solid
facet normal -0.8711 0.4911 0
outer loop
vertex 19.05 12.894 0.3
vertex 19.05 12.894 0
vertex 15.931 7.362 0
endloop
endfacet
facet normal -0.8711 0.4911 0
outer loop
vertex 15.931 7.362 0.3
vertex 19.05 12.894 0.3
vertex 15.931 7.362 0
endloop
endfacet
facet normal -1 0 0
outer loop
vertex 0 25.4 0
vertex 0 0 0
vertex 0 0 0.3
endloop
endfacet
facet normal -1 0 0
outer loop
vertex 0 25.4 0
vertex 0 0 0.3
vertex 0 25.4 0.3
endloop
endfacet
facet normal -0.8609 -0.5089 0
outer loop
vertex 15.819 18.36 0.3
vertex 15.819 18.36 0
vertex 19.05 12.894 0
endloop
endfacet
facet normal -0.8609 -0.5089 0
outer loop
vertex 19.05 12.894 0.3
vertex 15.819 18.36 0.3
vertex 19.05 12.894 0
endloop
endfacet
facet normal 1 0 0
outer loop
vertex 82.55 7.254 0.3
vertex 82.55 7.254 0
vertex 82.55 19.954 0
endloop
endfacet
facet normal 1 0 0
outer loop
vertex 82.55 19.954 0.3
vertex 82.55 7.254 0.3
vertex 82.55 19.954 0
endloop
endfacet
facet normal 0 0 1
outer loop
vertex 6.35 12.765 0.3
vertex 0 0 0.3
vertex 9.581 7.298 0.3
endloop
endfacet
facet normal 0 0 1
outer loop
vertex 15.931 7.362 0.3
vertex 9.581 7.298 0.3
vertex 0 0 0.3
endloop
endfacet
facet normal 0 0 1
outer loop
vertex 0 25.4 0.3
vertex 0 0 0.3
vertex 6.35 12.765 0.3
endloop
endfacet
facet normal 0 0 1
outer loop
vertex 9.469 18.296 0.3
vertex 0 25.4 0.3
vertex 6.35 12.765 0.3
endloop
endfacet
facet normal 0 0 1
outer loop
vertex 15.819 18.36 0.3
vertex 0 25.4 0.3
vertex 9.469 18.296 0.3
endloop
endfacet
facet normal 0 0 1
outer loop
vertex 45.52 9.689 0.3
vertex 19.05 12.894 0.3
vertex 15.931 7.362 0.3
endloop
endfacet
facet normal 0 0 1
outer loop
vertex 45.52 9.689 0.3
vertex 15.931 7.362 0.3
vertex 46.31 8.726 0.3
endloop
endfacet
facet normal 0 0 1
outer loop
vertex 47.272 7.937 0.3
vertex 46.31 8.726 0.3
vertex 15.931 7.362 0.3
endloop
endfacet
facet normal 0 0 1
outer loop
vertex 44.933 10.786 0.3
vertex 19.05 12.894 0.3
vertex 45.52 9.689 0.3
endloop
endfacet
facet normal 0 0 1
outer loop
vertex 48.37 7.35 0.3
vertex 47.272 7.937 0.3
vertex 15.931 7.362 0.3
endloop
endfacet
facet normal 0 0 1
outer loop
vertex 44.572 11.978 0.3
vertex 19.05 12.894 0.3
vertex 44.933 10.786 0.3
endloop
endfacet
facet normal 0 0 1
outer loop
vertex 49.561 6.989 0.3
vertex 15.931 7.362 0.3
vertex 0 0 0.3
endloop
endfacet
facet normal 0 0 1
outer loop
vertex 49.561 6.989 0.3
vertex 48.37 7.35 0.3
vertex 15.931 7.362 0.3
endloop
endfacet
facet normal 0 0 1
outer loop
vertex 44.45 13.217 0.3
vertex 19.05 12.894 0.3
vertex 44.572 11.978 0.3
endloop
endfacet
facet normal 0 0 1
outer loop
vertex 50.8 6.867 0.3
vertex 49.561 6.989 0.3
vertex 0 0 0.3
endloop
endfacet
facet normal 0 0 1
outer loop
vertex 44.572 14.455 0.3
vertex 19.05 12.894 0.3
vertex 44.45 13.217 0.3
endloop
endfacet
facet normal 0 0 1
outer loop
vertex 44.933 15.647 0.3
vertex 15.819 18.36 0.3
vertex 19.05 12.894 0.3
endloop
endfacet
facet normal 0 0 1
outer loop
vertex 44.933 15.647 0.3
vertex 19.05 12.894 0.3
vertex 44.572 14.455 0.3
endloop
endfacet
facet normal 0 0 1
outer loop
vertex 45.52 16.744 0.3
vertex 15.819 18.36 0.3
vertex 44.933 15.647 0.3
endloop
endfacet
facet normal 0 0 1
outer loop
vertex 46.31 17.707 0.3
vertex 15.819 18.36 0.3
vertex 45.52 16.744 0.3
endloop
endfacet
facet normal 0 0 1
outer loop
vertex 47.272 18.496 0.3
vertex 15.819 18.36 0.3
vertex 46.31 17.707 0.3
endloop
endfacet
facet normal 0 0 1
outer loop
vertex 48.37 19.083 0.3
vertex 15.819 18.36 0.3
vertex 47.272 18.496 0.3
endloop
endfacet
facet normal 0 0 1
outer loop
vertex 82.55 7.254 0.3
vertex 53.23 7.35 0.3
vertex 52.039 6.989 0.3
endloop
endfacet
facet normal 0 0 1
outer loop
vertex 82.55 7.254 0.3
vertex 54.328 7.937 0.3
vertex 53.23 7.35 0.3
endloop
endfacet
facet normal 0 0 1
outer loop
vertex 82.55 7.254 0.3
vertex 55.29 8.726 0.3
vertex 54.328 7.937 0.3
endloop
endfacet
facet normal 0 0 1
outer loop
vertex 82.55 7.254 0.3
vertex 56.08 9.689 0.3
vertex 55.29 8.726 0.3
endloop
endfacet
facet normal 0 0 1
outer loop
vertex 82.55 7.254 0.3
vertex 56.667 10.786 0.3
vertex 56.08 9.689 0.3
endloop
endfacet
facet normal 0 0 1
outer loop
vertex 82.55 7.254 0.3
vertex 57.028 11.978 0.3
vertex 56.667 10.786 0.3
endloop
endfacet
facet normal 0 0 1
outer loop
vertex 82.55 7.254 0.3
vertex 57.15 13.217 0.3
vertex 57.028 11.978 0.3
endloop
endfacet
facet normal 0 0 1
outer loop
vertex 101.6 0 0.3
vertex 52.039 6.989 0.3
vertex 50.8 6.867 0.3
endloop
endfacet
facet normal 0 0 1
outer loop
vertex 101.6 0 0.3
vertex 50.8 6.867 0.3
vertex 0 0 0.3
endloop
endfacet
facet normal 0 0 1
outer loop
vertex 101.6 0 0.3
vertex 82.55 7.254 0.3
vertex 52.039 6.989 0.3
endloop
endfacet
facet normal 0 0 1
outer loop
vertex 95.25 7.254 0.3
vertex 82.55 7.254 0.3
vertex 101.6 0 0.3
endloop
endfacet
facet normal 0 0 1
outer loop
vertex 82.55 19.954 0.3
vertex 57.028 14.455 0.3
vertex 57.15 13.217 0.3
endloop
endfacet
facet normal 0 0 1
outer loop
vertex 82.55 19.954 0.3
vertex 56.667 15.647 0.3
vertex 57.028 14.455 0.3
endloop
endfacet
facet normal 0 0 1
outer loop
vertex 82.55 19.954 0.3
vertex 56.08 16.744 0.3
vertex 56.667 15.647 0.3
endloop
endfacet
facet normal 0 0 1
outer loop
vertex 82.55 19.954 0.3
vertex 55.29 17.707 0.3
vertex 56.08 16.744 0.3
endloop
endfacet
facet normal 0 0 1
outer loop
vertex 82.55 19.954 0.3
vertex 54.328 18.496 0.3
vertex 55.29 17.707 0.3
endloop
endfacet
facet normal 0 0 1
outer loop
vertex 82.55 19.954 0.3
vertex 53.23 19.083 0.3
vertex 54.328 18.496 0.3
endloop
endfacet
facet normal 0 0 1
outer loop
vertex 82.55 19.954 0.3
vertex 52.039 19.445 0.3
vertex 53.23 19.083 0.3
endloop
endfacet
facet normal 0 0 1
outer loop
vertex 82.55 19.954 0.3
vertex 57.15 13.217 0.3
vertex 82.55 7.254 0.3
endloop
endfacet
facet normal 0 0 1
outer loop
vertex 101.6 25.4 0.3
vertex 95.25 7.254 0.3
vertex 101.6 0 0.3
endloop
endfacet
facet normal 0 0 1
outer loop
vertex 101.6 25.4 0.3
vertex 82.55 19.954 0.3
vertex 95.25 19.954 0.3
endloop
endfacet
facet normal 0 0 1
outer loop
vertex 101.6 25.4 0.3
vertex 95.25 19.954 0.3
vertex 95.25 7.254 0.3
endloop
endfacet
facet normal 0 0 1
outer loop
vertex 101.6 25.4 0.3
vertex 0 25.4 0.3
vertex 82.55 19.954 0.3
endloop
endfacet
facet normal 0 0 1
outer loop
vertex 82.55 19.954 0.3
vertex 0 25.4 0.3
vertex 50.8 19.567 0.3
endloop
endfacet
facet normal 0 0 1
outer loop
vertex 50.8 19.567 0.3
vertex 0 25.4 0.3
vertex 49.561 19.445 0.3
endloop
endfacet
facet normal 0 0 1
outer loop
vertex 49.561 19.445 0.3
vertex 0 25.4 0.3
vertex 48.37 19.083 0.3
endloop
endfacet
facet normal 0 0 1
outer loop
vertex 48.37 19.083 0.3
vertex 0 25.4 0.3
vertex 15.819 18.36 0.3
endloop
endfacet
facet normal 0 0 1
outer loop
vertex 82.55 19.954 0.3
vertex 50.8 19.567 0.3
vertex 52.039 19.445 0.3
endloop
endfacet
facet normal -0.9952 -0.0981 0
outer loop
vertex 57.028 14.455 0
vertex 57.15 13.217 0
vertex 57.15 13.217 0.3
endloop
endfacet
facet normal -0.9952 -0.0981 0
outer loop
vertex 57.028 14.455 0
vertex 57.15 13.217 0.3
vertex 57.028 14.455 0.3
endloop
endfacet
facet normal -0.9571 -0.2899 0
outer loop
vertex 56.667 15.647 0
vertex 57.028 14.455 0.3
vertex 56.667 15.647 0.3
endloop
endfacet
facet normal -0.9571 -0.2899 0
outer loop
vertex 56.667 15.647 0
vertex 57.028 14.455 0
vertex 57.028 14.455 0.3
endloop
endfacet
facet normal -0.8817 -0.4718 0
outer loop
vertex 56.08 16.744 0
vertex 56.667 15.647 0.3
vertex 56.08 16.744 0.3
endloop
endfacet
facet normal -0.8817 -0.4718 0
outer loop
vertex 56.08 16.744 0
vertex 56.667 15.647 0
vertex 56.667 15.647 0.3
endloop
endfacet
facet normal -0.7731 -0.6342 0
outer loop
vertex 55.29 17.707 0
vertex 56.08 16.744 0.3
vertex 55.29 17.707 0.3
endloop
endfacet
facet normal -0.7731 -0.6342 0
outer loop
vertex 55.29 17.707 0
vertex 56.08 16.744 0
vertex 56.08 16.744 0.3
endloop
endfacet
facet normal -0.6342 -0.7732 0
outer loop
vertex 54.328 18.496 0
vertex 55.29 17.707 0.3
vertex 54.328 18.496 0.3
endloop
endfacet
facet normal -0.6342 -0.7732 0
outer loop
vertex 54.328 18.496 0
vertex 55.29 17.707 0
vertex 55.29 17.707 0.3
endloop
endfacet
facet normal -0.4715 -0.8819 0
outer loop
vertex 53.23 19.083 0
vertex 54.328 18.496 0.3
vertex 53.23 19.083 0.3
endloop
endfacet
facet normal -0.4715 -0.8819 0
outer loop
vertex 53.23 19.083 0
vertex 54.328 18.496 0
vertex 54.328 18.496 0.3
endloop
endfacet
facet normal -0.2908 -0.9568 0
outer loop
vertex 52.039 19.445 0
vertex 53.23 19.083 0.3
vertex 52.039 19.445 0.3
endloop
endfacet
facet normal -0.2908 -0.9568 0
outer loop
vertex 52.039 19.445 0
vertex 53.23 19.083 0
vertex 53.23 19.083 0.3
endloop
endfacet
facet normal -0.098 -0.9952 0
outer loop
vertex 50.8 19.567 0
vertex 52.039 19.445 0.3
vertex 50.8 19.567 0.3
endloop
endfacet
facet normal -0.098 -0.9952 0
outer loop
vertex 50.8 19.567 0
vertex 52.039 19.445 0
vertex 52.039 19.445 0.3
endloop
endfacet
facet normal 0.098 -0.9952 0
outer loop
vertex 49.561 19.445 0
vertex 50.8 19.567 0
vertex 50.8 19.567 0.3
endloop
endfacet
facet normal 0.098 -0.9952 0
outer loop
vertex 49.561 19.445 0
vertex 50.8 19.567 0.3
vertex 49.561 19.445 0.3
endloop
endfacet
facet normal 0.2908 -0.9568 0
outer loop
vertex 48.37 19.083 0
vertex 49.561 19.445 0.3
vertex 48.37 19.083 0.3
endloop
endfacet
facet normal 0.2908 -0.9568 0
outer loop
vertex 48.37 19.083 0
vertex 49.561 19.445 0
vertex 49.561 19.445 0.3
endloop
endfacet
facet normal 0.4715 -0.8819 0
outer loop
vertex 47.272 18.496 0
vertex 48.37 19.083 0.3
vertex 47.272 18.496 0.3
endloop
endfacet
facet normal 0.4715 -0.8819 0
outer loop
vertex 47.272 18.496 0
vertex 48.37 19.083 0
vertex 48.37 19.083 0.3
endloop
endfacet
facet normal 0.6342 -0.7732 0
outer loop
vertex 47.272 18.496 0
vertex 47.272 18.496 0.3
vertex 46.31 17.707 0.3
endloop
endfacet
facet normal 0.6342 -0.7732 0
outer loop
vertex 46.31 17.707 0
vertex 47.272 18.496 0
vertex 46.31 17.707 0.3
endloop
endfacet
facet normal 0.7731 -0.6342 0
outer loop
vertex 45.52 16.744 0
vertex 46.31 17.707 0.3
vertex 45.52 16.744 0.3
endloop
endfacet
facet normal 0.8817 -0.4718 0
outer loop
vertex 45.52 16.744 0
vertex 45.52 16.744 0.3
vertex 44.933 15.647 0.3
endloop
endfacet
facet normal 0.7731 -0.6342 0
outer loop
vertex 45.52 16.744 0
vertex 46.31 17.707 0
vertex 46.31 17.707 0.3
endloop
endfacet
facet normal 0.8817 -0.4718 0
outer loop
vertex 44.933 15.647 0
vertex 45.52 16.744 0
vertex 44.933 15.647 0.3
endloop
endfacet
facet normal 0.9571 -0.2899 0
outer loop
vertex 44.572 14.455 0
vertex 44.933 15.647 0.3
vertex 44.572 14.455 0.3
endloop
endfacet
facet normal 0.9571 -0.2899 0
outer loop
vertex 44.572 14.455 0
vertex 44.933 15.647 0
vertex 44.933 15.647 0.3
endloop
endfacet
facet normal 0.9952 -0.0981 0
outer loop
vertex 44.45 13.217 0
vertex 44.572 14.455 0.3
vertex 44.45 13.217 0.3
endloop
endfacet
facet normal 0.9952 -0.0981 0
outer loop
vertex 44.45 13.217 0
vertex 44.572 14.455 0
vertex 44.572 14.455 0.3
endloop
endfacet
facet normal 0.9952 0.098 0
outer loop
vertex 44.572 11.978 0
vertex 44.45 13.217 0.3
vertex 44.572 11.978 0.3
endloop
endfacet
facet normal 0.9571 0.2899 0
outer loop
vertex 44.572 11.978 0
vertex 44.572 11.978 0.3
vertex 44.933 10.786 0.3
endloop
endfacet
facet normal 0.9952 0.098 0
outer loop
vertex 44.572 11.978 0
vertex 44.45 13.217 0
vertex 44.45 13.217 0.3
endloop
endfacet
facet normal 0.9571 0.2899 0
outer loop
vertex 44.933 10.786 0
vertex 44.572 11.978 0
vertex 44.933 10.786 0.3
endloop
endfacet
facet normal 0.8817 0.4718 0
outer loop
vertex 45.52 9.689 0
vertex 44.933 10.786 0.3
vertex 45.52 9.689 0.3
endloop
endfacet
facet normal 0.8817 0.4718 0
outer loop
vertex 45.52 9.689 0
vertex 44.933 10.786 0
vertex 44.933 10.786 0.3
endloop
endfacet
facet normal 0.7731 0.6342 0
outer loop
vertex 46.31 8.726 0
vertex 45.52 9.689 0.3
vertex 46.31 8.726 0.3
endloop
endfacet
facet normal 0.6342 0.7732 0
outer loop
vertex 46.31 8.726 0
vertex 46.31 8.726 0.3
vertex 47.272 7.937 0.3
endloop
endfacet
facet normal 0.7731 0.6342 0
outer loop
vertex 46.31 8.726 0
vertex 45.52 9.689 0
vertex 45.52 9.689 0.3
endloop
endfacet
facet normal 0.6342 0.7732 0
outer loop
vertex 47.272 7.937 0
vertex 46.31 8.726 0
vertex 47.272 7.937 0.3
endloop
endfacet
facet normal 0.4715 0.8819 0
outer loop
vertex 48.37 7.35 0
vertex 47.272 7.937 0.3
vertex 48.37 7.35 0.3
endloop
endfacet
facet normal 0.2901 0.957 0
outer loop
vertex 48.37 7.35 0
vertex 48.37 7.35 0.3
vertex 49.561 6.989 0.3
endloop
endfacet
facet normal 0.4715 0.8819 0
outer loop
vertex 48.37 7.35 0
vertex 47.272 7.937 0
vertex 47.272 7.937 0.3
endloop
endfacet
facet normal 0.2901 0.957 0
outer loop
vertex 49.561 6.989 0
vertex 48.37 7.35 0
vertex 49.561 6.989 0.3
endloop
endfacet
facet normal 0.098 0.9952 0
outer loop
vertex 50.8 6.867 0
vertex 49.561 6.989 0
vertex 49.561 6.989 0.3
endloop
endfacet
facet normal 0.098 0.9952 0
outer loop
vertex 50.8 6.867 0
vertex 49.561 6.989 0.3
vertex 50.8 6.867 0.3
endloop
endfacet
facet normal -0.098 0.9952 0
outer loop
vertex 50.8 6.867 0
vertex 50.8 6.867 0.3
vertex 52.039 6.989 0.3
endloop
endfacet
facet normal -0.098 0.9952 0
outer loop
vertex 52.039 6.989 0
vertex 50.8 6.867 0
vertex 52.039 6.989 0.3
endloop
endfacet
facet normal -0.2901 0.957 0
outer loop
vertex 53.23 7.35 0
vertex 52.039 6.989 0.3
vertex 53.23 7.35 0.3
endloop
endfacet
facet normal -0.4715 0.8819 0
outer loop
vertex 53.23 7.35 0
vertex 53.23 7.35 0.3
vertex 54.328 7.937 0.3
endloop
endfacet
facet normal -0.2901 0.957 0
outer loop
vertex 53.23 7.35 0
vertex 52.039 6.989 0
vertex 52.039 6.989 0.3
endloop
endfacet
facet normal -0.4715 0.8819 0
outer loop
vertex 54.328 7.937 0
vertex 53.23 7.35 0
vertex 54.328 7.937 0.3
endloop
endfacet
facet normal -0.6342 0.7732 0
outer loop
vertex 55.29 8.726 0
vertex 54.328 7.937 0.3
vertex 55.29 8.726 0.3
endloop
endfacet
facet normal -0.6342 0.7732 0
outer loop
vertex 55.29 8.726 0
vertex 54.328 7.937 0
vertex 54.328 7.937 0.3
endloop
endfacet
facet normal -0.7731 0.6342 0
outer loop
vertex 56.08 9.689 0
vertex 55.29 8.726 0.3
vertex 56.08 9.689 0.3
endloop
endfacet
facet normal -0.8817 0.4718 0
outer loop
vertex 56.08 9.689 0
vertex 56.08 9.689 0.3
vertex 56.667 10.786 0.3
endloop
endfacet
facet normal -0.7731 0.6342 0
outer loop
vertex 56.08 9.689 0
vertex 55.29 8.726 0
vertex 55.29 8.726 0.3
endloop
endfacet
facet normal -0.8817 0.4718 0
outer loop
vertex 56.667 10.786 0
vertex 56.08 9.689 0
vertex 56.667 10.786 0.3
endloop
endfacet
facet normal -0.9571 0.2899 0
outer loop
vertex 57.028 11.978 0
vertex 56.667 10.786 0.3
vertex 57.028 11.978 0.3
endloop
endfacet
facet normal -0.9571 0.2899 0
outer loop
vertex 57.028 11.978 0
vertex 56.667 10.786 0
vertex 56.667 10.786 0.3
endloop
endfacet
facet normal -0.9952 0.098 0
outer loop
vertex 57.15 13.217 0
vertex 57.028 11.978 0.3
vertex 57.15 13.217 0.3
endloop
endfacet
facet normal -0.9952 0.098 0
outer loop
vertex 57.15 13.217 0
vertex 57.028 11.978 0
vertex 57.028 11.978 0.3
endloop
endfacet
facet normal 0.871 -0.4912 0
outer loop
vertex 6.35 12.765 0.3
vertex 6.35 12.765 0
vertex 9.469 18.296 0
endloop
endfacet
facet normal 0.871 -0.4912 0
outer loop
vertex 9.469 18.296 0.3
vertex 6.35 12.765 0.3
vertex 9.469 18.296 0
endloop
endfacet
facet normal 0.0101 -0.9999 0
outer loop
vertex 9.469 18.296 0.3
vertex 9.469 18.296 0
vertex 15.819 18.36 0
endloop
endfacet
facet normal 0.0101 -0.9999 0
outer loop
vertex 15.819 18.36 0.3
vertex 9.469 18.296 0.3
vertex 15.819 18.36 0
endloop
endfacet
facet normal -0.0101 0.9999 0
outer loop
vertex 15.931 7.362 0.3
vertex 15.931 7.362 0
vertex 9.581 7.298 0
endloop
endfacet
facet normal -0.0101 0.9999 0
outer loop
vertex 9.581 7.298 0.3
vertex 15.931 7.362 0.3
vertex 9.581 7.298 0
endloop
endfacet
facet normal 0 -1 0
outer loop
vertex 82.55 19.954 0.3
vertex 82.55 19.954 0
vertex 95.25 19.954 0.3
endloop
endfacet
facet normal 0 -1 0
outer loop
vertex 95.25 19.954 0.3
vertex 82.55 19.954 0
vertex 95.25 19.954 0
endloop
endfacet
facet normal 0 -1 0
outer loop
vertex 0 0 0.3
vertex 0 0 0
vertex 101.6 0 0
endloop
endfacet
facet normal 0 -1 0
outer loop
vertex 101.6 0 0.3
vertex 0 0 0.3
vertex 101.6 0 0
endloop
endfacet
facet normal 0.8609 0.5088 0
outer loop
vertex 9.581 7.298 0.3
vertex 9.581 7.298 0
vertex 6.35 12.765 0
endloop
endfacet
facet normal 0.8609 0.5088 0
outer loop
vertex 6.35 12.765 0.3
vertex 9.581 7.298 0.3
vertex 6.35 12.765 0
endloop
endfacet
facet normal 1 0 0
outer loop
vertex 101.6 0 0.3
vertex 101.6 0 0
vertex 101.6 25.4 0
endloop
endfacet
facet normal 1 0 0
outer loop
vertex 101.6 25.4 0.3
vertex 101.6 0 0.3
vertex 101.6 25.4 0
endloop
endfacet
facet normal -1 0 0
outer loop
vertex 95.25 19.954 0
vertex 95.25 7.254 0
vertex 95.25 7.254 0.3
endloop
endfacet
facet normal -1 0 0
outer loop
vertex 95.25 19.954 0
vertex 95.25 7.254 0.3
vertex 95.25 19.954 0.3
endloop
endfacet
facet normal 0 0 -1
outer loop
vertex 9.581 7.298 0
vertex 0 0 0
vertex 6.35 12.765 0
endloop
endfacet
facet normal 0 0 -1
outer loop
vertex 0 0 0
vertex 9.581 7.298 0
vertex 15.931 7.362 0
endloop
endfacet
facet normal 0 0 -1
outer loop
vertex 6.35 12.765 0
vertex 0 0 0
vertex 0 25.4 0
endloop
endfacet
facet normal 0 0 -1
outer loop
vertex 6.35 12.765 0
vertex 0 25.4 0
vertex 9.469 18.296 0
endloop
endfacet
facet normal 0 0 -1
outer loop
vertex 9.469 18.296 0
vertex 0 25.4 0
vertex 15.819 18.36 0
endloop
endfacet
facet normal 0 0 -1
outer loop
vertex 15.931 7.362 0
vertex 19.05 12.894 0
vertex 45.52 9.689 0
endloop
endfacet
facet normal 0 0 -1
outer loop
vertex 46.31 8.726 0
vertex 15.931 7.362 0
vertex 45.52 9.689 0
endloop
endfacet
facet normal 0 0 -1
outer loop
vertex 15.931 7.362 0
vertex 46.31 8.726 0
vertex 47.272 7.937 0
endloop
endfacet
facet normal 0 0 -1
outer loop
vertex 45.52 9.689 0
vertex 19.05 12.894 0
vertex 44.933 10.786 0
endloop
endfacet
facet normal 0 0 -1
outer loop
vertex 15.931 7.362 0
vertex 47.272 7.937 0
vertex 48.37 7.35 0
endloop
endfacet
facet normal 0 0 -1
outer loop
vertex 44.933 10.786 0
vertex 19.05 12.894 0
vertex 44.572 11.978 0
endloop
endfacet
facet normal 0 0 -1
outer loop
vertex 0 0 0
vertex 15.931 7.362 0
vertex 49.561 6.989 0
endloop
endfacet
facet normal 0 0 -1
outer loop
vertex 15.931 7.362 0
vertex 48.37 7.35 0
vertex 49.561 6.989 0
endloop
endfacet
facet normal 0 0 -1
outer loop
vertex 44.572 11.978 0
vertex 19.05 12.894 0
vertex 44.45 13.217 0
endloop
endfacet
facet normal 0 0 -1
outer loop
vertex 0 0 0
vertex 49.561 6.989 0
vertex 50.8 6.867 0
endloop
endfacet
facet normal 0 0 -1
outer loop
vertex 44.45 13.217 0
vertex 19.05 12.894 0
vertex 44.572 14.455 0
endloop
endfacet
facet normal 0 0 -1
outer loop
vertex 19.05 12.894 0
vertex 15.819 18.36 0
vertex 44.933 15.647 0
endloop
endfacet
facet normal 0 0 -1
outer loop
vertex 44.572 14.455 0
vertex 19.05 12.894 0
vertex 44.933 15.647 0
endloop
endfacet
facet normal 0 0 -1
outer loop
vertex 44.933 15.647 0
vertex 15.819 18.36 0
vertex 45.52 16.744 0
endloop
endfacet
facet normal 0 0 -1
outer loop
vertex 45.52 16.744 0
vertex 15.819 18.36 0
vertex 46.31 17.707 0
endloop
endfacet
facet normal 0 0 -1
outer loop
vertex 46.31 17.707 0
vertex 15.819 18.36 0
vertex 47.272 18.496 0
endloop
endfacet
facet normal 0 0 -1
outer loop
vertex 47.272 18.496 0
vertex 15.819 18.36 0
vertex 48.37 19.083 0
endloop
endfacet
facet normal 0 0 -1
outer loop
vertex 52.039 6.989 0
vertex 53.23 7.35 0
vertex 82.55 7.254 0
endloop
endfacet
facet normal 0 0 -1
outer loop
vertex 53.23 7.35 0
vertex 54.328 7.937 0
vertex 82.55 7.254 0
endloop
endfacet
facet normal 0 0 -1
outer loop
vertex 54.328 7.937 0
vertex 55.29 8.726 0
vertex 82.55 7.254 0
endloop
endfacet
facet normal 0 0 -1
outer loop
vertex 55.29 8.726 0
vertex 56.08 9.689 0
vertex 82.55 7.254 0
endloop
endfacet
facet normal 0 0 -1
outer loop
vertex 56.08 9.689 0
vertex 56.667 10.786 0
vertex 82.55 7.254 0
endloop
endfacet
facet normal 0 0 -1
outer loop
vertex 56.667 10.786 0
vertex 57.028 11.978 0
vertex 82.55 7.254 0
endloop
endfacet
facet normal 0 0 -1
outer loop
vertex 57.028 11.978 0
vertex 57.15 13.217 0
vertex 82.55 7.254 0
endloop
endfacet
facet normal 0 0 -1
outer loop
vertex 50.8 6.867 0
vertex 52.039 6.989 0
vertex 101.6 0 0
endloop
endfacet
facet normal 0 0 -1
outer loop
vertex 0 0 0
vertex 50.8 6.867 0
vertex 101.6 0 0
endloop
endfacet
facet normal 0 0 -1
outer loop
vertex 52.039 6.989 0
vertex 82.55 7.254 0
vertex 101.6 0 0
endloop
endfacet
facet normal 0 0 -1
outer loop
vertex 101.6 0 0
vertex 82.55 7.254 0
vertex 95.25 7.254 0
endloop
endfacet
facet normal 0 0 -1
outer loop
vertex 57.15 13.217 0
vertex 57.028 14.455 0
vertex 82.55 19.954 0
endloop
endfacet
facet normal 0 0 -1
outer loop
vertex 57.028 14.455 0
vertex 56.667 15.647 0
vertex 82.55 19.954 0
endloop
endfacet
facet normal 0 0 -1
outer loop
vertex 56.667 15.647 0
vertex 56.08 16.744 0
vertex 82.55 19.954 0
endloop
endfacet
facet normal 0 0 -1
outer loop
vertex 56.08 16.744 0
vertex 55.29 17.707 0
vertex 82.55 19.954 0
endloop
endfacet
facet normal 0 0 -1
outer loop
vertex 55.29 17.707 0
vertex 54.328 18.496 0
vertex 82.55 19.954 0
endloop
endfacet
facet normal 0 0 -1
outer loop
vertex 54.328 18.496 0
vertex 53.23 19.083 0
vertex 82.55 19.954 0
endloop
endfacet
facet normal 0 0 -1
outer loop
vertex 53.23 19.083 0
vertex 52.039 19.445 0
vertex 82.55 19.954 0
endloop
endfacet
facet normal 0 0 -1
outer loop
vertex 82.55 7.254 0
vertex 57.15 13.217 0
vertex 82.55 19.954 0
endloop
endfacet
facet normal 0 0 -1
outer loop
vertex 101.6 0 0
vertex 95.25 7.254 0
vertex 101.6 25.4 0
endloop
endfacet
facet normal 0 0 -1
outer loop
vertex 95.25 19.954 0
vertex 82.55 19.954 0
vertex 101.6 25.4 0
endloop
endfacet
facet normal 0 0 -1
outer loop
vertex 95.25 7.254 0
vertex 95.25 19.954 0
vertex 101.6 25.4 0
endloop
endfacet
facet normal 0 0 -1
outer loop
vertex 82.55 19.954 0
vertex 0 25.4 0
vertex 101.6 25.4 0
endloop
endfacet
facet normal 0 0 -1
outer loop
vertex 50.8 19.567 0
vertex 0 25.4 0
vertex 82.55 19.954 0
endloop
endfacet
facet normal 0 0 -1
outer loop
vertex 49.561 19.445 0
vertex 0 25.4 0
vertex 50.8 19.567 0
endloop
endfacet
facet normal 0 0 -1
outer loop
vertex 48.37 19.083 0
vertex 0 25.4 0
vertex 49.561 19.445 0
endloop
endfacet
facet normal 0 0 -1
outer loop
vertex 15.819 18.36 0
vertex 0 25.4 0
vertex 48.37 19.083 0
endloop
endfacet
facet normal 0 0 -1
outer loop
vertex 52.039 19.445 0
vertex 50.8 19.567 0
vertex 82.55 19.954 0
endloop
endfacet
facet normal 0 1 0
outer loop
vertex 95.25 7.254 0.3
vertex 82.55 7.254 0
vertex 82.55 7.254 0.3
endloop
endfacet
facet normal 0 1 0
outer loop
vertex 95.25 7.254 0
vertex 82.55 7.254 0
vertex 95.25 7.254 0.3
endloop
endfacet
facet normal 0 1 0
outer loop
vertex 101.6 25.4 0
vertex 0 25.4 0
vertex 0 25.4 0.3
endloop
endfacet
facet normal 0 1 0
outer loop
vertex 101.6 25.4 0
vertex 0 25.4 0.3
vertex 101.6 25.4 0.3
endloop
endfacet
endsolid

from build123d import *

# Parameters (mm, degrees)
F0_W     = 101.6
F0_H     = 25.4
F0_R     = 6.35
F0_W_2   = 12.7
F0_H_2   = 12.7
F1_DEPTH = 0.3


with BuildPart() as f1:
    # F0 (on Top) → F1 (new body)
    with BuildSketch(Plane.XY):
        with Locations((50.8, 12.7)):
            Rectangle(F0_W, F0_H)
        Polygon((9.469252, 18.295827), (15.818924, 18.360389), (19.049672, 12.893693), (15.930748, 7.362435), (9.581076, 7.297873), (6.350328, 12.764569), align=None, mode=Mode.SUBTRACT)
        with Locations((50.8, 13.216523)):
            Circle(F0_R, mode=Mode.SUBTRACT)
        with Locations((88.9, 13.603915)):
            Rectangle(F0_W_2, F0_H_2, mode=Mode.SUBTRACT)
    extrude(amount=F1_DEPTH)


solid = f1.part
